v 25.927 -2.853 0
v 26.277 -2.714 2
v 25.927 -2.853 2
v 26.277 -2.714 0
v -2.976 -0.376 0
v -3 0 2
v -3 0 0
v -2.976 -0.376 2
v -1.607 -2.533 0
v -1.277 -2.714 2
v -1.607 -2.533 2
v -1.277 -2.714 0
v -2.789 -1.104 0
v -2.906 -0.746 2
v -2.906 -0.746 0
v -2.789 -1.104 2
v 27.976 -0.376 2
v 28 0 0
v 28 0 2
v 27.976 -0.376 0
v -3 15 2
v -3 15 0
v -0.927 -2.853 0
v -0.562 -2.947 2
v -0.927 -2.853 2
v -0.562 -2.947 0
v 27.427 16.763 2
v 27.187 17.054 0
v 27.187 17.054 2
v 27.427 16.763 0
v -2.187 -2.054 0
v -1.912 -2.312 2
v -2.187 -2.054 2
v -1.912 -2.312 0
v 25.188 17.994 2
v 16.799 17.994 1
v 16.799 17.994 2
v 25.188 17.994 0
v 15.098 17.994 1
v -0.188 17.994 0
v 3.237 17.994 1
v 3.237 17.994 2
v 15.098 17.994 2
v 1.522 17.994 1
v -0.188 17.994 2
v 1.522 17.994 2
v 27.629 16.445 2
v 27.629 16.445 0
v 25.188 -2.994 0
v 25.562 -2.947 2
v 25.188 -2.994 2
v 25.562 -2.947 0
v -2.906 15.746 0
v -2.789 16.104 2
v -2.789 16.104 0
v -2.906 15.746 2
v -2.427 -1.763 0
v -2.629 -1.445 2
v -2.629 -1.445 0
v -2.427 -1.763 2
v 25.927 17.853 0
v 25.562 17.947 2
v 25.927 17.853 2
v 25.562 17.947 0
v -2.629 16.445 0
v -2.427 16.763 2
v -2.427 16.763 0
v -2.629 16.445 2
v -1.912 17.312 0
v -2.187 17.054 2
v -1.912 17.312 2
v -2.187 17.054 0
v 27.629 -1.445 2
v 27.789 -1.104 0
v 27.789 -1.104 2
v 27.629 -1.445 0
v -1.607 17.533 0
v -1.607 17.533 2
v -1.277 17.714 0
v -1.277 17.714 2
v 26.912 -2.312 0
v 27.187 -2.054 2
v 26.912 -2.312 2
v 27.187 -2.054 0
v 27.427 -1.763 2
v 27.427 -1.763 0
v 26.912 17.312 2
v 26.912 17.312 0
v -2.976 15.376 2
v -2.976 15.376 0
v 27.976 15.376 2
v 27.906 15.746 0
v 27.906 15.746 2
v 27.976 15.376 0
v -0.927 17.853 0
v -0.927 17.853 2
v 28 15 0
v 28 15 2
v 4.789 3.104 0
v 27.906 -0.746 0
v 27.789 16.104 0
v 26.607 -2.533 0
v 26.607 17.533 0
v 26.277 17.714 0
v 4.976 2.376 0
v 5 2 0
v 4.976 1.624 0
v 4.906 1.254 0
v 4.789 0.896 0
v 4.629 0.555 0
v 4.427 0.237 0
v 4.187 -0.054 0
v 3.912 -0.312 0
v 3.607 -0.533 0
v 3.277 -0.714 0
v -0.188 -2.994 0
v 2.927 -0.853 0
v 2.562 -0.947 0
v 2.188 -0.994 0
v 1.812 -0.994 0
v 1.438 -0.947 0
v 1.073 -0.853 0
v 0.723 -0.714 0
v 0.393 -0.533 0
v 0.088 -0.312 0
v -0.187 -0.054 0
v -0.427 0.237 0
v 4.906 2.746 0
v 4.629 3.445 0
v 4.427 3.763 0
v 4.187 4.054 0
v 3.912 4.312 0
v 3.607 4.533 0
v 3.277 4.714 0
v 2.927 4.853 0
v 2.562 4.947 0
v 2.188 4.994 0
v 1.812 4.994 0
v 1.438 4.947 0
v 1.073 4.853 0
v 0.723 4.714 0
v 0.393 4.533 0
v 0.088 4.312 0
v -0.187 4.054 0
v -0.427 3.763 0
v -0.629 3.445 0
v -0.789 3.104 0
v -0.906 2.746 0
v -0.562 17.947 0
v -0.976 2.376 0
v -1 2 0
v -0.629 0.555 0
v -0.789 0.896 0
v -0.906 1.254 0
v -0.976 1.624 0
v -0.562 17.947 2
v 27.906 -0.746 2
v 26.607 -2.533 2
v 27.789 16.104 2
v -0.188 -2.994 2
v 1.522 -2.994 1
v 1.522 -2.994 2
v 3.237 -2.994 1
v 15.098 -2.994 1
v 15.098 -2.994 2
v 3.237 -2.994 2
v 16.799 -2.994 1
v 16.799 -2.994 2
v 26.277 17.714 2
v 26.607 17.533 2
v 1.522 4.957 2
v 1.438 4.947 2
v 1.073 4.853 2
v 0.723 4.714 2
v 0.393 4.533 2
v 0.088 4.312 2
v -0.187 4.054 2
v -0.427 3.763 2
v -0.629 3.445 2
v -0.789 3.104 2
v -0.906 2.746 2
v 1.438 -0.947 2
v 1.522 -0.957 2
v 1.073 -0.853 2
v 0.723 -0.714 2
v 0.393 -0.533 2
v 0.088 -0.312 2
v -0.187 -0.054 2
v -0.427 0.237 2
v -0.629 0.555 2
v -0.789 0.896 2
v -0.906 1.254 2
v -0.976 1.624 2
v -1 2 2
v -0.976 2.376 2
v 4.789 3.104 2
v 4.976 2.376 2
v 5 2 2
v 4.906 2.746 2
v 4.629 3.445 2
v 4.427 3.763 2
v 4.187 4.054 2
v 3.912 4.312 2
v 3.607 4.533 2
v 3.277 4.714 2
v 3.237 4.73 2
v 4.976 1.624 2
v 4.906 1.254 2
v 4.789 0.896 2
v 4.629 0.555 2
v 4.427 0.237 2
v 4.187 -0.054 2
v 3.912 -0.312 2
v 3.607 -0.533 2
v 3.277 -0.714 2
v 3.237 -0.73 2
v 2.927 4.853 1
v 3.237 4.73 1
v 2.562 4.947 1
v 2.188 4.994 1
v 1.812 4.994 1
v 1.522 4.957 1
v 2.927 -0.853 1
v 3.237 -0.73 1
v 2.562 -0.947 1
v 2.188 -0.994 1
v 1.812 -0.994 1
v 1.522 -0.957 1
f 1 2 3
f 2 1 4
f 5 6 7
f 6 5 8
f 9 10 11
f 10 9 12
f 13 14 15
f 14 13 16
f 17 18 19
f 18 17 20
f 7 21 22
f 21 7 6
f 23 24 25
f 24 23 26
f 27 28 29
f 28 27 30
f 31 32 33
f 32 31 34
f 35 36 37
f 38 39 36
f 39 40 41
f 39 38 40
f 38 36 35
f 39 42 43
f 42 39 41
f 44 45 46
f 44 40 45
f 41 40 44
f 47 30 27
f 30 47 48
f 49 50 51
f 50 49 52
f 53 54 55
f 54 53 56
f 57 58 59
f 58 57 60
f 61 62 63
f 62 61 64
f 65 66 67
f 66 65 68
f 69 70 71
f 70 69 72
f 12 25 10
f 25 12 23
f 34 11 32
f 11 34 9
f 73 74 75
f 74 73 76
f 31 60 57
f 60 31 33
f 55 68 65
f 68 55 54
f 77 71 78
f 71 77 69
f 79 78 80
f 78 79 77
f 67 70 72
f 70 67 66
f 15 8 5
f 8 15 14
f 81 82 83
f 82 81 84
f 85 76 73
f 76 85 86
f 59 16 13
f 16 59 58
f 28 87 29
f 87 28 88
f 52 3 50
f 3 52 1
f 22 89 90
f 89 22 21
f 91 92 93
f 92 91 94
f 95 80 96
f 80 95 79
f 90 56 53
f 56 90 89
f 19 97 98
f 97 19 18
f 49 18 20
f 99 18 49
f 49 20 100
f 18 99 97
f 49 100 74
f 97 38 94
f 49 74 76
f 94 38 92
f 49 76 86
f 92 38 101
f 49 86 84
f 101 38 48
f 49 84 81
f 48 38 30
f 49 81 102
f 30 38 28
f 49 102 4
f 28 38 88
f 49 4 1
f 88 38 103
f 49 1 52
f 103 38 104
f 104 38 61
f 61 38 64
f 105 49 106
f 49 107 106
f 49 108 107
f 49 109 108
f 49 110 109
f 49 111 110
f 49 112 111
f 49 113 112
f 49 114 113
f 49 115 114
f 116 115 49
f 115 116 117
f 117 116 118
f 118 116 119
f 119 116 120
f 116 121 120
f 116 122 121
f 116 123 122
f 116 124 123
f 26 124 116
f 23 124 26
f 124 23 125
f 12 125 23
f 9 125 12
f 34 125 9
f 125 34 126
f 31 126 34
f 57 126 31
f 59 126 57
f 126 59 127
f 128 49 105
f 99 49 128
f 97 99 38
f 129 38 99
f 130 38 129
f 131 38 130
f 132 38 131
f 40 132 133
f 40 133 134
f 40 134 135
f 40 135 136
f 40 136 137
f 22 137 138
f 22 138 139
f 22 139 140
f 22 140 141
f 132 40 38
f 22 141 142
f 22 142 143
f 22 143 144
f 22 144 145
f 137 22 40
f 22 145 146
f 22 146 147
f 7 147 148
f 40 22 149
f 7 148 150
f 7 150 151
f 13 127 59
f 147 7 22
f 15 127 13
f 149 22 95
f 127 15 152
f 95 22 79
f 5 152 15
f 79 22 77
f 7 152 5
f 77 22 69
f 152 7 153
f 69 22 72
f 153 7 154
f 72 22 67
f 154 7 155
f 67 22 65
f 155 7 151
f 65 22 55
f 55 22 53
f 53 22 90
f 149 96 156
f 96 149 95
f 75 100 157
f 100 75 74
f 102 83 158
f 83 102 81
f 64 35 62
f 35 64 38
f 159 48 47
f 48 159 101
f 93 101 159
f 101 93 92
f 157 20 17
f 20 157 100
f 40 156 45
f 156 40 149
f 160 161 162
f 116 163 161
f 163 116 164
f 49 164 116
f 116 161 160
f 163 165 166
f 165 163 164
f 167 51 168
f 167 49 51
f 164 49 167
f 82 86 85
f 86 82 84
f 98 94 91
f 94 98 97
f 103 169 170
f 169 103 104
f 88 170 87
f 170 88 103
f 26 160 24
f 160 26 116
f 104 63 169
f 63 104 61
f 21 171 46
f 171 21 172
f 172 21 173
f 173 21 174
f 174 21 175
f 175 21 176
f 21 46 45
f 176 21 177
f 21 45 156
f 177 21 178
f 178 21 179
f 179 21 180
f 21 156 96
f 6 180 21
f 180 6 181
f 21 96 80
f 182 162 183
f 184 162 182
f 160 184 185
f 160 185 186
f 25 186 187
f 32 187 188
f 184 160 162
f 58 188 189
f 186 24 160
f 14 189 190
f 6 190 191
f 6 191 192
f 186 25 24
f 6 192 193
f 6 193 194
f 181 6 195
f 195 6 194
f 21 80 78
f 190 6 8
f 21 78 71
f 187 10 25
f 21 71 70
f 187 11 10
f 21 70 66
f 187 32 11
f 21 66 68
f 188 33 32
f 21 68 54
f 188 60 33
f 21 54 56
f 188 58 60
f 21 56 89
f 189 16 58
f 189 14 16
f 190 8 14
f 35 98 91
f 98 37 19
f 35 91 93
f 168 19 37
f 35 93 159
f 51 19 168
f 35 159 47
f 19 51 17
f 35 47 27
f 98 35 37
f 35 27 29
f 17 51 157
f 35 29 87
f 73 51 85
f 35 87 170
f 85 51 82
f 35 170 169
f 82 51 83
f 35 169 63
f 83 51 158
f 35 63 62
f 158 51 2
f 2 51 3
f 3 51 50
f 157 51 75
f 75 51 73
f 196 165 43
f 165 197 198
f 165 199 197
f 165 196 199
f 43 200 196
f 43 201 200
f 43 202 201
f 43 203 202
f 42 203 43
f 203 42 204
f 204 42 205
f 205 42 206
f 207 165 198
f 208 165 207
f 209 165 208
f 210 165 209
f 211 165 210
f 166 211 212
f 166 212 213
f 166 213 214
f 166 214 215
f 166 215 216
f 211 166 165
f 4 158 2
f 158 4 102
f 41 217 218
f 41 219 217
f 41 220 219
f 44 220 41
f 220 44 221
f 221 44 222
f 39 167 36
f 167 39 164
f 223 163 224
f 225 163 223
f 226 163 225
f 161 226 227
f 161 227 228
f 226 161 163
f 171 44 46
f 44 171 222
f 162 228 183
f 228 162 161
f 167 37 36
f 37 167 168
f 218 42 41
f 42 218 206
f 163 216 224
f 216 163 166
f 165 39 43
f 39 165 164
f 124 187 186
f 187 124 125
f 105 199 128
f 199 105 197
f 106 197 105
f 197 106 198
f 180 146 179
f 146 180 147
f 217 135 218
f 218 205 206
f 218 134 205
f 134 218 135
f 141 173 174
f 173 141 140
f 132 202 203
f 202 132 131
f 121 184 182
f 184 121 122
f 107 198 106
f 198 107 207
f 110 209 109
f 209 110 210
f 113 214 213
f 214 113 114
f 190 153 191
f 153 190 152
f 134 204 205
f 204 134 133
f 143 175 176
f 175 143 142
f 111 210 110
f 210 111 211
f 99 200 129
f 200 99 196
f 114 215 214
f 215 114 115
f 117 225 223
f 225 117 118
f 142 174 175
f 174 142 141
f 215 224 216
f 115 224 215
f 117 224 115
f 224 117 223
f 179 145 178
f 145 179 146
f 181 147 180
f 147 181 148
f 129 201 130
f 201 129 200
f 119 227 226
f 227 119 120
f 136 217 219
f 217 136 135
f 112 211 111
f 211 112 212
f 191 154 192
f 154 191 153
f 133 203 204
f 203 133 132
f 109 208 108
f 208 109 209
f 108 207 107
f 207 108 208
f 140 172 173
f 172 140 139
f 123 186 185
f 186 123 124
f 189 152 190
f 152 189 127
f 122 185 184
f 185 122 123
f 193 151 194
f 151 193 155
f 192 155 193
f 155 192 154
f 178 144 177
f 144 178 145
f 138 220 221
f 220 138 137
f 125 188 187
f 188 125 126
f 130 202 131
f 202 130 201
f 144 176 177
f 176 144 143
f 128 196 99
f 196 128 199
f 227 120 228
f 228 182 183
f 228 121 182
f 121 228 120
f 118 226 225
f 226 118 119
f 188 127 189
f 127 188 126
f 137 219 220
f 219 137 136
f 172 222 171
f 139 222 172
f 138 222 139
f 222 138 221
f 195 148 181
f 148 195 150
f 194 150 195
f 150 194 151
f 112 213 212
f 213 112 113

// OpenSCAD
$fn=50;

difference(){
    minkowski(){
    cube([25,15,1]);
    cylinder(r=3, h=1);
    }
    translate([0,-1,1]) linear_extrude(3) text("", font="Webdings", size=22);
    translate([2,2,-1]) cylinder(r=3, h=7);
}
